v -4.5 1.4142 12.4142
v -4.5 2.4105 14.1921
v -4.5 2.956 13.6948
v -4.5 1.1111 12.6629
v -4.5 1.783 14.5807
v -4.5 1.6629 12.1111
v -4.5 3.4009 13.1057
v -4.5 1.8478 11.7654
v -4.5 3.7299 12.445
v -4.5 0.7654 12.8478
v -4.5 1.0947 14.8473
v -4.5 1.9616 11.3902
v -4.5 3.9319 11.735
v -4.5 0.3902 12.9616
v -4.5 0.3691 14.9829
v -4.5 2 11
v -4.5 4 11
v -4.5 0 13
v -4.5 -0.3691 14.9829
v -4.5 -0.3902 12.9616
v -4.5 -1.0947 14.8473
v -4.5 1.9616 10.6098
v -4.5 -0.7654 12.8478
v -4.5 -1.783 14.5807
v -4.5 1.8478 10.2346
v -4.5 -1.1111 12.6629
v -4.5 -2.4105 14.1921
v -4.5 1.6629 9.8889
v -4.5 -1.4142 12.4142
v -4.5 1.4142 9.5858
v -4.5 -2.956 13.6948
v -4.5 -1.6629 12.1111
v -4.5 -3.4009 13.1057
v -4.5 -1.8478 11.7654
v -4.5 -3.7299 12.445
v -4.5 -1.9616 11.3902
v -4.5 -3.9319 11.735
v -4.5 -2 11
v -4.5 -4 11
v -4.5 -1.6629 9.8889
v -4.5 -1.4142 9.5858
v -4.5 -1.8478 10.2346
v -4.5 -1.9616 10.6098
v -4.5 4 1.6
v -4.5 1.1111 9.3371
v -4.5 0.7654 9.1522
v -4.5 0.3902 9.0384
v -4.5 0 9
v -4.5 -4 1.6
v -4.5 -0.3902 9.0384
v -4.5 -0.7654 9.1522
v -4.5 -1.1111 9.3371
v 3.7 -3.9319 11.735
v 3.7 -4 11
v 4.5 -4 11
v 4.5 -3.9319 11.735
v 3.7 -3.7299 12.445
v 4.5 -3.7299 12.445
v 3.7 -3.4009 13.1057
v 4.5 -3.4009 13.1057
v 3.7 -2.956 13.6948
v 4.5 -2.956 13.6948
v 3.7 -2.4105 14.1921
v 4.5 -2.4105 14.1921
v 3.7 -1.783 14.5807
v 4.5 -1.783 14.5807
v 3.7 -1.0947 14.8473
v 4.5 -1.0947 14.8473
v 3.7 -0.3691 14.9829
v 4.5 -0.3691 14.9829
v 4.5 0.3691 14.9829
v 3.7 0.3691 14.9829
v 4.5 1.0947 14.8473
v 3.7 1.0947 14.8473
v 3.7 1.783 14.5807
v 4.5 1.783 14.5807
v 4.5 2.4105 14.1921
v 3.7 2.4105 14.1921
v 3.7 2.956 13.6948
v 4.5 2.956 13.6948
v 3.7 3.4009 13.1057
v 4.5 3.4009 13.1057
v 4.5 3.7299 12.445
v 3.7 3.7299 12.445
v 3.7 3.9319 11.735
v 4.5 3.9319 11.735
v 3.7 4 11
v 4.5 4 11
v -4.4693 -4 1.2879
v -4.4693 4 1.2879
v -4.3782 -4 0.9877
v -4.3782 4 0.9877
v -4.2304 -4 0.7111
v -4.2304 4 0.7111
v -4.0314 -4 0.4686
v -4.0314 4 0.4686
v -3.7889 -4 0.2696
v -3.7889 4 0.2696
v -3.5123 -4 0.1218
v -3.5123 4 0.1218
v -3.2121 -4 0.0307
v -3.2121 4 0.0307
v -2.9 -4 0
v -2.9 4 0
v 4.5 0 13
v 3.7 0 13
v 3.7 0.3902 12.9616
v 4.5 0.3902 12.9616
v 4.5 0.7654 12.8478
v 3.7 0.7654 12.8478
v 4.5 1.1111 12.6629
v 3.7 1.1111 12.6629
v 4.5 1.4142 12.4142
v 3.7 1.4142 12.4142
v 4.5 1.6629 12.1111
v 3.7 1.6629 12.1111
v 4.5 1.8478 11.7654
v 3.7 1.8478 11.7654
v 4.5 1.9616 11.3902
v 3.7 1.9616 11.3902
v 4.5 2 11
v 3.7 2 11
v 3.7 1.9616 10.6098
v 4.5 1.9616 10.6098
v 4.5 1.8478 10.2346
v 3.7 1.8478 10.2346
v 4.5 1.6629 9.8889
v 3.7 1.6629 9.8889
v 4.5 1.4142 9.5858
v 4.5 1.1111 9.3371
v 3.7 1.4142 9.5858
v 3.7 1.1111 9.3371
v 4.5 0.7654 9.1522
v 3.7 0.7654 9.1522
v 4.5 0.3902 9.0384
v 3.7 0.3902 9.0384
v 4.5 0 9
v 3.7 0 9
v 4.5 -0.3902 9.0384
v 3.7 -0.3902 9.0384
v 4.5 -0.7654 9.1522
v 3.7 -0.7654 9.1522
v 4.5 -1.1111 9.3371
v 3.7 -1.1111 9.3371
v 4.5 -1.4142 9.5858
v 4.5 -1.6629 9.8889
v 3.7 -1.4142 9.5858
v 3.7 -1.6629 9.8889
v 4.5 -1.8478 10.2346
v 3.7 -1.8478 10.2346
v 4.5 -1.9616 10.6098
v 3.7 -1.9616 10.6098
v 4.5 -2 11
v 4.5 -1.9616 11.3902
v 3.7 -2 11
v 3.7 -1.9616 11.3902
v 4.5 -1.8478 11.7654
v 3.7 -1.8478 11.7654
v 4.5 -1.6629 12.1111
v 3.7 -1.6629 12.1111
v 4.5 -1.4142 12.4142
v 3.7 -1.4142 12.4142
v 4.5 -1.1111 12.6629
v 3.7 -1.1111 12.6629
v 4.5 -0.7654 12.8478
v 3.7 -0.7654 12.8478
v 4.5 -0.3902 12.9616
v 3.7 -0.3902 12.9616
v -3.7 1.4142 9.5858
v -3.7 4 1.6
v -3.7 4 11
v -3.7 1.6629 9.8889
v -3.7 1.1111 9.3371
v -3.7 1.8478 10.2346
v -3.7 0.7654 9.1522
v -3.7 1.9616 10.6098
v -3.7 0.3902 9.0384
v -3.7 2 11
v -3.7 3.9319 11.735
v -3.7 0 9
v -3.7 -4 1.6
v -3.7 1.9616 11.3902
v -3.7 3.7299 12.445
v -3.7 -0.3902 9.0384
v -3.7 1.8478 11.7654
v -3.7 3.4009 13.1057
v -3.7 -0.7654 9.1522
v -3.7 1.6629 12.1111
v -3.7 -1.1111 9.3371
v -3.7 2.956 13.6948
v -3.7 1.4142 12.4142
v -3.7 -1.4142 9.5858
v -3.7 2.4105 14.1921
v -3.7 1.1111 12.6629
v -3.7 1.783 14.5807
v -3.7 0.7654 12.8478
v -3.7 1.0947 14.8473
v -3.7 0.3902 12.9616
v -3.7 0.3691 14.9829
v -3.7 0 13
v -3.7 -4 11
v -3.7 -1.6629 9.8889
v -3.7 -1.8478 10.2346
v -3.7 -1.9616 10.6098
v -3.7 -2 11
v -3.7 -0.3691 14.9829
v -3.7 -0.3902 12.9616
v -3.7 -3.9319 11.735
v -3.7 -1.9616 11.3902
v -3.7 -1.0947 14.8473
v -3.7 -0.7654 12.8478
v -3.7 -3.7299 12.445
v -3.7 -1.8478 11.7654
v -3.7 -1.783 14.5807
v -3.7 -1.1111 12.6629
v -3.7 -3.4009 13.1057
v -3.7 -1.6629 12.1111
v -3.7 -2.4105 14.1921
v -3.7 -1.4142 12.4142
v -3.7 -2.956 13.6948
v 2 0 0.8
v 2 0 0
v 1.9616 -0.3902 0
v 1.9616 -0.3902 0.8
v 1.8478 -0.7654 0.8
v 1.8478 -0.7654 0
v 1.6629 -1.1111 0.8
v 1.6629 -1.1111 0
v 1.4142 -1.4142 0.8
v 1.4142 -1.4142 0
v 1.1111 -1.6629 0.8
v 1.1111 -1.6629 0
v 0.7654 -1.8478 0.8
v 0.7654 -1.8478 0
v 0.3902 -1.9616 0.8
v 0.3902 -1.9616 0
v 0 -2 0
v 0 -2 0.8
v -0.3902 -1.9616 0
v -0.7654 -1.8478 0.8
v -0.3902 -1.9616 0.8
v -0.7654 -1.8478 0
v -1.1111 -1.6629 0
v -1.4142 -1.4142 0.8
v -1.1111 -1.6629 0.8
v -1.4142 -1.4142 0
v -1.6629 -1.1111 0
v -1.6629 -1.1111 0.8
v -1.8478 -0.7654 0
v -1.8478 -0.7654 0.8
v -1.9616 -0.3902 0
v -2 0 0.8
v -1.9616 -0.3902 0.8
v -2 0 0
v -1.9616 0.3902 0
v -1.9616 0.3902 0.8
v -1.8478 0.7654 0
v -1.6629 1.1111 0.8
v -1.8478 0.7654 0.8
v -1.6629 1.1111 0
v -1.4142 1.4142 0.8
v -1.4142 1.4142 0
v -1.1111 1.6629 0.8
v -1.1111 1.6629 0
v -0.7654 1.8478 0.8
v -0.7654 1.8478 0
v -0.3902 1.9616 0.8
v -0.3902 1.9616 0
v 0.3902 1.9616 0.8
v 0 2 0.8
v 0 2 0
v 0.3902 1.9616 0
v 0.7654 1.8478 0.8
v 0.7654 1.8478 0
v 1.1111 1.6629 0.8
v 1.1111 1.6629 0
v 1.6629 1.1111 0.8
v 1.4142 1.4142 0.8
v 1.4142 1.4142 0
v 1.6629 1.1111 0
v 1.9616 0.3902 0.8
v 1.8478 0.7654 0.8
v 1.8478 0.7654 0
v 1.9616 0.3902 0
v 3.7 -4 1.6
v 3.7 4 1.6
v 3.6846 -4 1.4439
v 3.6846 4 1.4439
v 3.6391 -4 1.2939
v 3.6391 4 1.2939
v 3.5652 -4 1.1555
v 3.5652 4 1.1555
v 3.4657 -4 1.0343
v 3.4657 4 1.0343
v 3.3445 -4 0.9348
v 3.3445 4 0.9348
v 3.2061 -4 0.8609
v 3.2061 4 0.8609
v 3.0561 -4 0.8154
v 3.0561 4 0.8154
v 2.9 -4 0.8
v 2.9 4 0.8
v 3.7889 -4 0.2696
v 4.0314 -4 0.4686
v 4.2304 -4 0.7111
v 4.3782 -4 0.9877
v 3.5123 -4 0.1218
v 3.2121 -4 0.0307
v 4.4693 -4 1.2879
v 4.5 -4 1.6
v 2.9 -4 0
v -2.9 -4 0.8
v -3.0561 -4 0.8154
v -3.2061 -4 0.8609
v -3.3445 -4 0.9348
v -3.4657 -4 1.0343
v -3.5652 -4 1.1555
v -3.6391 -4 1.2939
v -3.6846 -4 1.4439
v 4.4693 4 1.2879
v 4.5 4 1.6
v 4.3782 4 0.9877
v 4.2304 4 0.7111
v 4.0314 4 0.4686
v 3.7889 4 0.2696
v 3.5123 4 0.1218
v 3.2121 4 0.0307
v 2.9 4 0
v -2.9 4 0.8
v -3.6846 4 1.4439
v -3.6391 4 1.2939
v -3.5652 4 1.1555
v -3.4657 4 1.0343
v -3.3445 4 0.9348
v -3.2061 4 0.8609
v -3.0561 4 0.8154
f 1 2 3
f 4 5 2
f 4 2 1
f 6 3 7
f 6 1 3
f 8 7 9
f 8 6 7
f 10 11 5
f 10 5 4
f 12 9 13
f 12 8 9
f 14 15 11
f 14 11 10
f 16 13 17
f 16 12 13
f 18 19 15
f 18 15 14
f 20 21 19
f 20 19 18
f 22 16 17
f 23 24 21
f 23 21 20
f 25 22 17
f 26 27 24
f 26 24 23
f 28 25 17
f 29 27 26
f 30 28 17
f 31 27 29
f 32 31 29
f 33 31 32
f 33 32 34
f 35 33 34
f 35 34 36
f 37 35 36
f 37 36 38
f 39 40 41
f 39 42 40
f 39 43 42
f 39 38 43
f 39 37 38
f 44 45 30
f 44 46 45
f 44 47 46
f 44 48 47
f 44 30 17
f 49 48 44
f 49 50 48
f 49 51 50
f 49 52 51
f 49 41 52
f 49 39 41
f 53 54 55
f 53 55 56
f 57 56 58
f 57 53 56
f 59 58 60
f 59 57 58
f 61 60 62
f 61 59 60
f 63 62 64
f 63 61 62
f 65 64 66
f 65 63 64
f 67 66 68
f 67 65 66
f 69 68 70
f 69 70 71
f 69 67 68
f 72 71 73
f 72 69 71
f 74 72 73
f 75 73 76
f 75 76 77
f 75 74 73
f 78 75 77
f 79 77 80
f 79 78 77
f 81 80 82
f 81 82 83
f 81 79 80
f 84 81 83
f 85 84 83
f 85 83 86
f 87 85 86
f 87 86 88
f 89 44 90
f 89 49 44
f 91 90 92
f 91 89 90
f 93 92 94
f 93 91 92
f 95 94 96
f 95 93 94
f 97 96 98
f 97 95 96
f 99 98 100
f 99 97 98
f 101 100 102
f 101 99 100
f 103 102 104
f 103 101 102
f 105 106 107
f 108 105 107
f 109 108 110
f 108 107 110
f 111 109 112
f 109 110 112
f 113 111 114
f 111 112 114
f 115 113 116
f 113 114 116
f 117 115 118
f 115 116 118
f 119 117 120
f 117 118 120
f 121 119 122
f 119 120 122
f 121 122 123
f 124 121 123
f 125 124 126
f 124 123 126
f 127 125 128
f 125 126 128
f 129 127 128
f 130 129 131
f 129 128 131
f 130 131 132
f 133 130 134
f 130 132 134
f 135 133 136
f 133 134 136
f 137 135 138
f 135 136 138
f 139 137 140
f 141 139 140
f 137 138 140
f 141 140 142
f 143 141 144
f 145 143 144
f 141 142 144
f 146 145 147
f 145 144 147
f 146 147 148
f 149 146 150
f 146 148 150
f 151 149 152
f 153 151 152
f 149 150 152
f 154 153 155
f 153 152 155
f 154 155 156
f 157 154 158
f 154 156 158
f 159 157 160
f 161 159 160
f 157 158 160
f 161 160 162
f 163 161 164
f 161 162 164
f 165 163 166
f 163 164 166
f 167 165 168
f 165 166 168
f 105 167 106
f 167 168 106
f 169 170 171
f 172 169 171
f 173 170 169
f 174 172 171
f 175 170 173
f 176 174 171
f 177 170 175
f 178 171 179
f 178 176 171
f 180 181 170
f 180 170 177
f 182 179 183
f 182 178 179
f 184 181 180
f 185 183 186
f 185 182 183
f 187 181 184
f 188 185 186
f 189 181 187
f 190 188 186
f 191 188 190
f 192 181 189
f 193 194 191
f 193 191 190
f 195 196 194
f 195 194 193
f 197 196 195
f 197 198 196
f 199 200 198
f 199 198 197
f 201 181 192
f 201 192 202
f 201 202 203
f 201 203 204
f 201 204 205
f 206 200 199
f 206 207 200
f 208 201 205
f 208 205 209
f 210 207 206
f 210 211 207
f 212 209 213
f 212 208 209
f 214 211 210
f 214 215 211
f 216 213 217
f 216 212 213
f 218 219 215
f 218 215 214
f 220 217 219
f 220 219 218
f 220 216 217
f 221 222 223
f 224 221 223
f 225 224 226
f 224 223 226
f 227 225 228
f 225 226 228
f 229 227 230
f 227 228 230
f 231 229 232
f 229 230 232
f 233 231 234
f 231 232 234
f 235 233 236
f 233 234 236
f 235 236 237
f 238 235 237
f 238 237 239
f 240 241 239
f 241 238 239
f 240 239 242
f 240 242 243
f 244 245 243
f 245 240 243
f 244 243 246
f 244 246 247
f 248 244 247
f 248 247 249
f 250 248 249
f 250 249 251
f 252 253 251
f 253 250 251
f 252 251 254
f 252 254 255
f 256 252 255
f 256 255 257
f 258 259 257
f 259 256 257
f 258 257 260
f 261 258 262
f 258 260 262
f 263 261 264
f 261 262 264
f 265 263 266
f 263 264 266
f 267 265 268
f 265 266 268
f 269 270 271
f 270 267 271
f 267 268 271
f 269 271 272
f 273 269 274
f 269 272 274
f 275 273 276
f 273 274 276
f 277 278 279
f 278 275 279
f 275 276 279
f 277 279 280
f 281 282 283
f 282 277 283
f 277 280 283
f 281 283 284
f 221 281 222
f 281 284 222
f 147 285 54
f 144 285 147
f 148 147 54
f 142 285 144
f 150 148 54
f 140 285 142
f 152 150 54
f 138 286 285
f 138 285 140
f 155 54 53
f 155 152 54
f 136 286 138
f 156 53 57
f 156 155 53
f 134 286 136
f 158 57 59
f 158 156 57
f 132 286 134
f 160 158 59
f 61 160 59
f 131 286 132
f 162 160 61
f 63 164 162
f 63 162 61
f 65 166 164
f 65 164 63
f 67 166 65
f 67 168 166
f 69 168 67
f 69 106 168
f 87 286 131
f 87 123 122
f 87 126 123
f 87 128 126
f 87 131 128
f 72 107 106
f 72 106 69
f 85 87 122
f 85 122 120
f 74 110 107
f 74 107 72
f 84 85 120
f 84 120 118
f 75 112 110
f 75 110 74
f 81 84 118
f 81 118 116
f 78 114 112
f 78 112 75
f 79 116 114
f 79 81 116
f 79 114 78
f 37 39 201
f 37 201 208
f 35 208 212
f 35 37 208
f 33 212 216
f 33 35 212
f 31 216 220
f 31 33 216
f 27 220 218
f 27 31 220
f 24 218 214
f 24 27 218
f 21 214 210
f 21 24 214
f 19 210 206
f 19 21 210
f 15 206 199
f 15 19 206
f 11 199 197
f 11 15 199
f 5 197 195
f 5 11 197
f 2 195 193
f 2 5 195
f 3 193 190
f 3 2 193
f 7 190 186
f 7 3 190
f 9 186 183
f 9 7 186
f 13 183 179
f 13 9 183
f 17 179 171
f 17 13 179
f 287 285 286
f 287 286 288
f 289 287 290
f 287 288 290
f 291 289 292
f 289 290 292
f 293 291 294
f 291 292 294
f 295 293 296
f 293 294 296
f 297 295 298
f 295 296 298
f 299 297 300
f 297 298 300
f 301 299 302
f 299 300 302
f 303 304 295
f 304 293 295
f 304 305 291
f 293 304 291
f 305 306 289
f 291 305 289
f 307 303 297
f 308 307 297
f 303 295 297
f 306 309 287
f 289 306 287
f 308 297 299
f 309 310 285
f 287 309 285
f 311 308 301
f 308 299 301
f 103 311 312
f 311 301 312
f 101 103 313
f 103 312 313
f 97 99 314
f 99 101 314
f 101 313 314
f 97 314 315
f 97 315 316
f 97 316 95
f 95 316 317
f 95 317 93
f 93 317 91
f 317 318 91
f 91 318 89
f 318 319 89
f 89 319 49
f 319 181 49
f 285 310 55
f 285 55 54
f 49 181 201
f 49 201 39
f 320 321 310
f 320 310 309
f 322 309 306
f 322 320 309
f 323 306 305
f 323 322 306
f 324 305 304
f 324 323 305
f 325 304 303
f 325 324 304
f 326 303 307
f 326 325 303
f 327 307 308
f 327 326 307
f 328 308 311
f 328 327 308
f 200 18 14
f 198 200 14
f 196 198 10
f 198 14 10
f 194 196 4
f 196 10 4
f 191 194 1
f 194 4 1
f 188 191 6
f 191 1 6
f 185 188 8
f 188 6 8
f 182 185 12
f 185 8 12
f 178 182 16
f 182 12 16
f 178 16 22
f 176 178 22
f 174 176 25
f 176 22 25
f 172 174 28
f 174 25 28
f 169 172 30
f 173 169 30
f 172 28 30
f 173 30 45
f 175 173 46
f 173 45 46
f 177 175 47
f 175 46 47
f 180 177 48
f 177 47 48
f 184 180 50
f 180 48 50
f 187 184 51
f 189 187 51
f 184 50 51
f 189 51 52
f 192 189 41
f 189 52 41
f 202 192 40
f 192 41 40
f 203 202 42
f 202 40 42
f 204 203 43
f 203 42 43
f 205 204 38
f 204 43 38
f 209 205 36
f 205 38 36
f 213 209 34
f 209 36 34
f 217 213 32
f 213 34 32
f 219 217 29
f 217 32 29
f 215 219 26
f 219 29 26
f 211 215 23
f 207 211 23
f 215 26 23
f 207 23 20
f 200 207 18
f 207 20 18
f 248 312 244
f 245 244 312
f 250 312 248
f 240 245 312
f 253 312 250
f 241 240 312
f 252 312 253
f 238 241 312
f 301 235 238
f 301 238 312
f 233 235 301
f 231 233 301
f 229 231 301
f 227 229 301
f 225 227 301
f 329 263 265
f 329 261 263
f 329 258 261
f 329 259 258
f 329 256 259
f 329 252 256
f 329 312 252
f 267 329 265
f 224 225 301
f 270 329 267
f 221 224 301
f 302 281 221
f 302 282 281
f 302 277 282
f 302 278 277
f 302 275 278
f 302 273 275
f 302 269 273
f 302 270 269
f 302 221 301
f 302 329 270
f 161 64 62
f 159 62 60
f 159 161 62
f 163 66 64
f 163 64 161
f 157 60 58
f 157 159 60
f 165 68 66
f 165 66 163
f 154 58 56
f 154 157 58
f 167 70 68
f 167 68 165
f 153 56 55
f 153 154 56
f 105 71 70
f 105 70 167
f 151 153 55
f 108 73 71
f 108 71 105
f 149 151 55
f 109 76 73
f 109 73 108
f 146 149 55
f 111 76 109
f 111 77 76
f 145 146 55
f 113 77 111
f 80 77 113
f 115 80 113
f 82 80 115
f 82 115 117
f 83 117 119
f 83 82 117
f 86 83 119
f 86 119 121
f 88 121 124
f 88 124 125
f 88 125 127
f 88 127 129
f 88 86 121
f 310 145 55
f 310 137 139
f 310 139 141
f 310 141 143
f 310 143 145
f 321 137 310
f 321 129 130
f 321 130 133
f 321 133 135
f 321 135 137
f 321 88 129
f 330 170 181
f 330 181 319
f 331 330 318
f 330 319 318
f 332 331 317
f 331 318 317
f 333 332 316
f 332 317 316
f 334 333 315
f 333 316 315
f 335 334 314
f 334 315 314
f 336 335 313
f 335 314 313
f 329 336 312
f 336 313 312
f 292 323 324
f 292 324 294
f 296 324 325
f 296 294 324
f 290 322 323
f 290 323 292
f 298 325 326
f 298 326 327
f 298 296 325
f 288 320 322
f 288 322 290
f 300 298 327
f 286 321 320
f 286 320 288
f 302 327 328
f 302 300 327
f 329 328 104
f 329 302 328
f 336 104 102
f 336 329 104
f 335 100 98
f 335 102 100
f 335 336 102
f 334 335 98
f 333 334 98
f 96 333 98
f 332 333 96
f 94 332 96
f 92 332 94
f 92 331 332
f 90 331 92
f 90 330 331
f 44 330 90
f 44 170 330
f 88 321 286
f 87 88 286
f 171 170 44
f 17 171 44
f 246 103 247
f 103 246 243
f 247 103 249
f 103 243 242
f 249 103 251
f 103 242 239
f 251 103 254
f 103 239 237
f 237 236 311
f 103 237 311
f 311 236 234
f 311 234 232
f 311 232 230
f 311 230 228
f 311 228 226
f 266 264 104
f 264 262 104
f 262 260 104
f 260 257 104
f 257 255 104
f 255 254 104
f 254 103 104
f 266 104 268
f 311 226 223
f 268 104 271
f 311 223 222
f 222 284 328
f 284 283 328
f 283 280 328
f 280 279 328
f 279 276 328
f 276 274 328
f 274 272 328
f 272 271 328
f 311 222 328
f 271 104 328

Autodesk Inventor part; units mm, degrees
ref_plane "YZ Plane" through (0, 0, 0) normal (1, 0, 0) x (0, 1, 0)
ref_plane "XZ Plane" through (0, 0, 0) normal (0, 1, 0) x (-1, 0, 0)
ref_plane "XY Plane" through (0, 0, 0) normal (0, 0, 1) x (1, 0, 0)
sketch "Sketch1" plane through (0, 0, 0) normal (0, 0, 1) x (1, 0, 0)
  circle A0 centre (0, 0) radius 2
  line L0 (-4.5, 4) -> (4.5, 4)
  line L1 (4.5, 4) -> (4.5, -4)
  line L2 (4.5, -4) -> (-4.5, -4)
  line L3 (-4.5, -4) -> (-4.5, 4)
  line L4 (-4.5, 4) -> (4.5, -4) construction
  dimension "d0" = 4
  dimension "d1" = 8
  dimension "d2" = 9
extrude "Plate1" add sketch "Sketch1" along normal blind 0.8
sketch "Sketch2" plane through (3.7, 4, 0) normal (1, 0, 0) x (0, 1, 0)
  line L0 (-8, 0) -> (0, 0)
  line L1 (0, 0) -> (0, 15)
  line L2 (0, 15) -> (-8, 15)
  line L3 (-8, 15) -> (-8, 0)
edge flange "Flange1" height 15 angle 90 thickness 0.8 bend radius 0.8 thickness toward (1, 0, 0) relief tear relief width 0.8 relief depth 0.4 corner gap 0.8 corner form 0 edges at (4.5, 0, 0.8) (-4.5, 0, 0.8) wall of the first edge with corners at (3.7, -4, 0) (3.7, 4, 0) (3.7, 4, 15) (3.7, -4, 15)
bend "Bend1"
corner "Corner1"
sketch "Sketch3" plane through (-4.5, -4, 15) normal (-1, 0, 0) x (0, 0, 1)
  line L0 (-13.4, 8) -> (-13.4, 0) construction
  line L1 (0, 0) -> (-13.4, 0) projected
  line L2 (0, 8) -> (0, 0) projected
  line L3 (-13.4, 8) -> (0, 8) projected
  circle A0 centre (-4, 4) radius 4
  point P0 (-15, 4)
  point P1 (-4, 8)
  point P2 (0, 4)
  point P3 (-4, 0)
extrude "Cut1" cut sketch "Sketch3" against normal through all contours L1 A0 L2 | A0 L3 L2
sketch "Sketch4" plane through (-4.5, -4, 1.6) normal (-1, 0, 0) x (0, 0, 1)
  arc A0 (9.4, 0) -> (9.4, 8) centre (9.4, 4) ccw projected
  circle A1 centre (9.4, 4) radius 2
  point P0 (-1.6, 4)
  dimension "d16" = 4
extrude "Cut2" cut sketch "Sketch4" against normal through all
equation "\"d14\" = Thickness"
equation "\"d17\" = Thickness"
equation "\"d3\" = Thickness"
equation "\"d4\" = BendReliefWidth"
equation "\"d5\" = BendReliefDepth"
equation "\"d6\" = MinimumRemnant"
equation "\"d7\" = TransitionRadius"
equation "\"d10\" = BendRadius"
equation "\"d11\" = CornerReliefSize"
equation "\"d12\" = GapSize"
equation "\"d13\" = JacobiRadiusSize"
equation "\"BendRadius\" = Thickness"
equation "\"BendReliefWidth\" = Thickness"
equation "\"BendReliefDepth\" = 0.5 * Thickness"
equation "\"CornerReliefSize\" = 4 * Thickness"
equation "\"MinimumRemnant\" = 2 * Thickness"
equation "\"TransitionRadius\" = BendRadius"
equation "\"JacobiRadiusSize\" = BendRadius"
equation "\"GapSize\" = Thickness"
equation "\"Thickness\" = 0.8"
properties part number "LA-T8-Bracket"
